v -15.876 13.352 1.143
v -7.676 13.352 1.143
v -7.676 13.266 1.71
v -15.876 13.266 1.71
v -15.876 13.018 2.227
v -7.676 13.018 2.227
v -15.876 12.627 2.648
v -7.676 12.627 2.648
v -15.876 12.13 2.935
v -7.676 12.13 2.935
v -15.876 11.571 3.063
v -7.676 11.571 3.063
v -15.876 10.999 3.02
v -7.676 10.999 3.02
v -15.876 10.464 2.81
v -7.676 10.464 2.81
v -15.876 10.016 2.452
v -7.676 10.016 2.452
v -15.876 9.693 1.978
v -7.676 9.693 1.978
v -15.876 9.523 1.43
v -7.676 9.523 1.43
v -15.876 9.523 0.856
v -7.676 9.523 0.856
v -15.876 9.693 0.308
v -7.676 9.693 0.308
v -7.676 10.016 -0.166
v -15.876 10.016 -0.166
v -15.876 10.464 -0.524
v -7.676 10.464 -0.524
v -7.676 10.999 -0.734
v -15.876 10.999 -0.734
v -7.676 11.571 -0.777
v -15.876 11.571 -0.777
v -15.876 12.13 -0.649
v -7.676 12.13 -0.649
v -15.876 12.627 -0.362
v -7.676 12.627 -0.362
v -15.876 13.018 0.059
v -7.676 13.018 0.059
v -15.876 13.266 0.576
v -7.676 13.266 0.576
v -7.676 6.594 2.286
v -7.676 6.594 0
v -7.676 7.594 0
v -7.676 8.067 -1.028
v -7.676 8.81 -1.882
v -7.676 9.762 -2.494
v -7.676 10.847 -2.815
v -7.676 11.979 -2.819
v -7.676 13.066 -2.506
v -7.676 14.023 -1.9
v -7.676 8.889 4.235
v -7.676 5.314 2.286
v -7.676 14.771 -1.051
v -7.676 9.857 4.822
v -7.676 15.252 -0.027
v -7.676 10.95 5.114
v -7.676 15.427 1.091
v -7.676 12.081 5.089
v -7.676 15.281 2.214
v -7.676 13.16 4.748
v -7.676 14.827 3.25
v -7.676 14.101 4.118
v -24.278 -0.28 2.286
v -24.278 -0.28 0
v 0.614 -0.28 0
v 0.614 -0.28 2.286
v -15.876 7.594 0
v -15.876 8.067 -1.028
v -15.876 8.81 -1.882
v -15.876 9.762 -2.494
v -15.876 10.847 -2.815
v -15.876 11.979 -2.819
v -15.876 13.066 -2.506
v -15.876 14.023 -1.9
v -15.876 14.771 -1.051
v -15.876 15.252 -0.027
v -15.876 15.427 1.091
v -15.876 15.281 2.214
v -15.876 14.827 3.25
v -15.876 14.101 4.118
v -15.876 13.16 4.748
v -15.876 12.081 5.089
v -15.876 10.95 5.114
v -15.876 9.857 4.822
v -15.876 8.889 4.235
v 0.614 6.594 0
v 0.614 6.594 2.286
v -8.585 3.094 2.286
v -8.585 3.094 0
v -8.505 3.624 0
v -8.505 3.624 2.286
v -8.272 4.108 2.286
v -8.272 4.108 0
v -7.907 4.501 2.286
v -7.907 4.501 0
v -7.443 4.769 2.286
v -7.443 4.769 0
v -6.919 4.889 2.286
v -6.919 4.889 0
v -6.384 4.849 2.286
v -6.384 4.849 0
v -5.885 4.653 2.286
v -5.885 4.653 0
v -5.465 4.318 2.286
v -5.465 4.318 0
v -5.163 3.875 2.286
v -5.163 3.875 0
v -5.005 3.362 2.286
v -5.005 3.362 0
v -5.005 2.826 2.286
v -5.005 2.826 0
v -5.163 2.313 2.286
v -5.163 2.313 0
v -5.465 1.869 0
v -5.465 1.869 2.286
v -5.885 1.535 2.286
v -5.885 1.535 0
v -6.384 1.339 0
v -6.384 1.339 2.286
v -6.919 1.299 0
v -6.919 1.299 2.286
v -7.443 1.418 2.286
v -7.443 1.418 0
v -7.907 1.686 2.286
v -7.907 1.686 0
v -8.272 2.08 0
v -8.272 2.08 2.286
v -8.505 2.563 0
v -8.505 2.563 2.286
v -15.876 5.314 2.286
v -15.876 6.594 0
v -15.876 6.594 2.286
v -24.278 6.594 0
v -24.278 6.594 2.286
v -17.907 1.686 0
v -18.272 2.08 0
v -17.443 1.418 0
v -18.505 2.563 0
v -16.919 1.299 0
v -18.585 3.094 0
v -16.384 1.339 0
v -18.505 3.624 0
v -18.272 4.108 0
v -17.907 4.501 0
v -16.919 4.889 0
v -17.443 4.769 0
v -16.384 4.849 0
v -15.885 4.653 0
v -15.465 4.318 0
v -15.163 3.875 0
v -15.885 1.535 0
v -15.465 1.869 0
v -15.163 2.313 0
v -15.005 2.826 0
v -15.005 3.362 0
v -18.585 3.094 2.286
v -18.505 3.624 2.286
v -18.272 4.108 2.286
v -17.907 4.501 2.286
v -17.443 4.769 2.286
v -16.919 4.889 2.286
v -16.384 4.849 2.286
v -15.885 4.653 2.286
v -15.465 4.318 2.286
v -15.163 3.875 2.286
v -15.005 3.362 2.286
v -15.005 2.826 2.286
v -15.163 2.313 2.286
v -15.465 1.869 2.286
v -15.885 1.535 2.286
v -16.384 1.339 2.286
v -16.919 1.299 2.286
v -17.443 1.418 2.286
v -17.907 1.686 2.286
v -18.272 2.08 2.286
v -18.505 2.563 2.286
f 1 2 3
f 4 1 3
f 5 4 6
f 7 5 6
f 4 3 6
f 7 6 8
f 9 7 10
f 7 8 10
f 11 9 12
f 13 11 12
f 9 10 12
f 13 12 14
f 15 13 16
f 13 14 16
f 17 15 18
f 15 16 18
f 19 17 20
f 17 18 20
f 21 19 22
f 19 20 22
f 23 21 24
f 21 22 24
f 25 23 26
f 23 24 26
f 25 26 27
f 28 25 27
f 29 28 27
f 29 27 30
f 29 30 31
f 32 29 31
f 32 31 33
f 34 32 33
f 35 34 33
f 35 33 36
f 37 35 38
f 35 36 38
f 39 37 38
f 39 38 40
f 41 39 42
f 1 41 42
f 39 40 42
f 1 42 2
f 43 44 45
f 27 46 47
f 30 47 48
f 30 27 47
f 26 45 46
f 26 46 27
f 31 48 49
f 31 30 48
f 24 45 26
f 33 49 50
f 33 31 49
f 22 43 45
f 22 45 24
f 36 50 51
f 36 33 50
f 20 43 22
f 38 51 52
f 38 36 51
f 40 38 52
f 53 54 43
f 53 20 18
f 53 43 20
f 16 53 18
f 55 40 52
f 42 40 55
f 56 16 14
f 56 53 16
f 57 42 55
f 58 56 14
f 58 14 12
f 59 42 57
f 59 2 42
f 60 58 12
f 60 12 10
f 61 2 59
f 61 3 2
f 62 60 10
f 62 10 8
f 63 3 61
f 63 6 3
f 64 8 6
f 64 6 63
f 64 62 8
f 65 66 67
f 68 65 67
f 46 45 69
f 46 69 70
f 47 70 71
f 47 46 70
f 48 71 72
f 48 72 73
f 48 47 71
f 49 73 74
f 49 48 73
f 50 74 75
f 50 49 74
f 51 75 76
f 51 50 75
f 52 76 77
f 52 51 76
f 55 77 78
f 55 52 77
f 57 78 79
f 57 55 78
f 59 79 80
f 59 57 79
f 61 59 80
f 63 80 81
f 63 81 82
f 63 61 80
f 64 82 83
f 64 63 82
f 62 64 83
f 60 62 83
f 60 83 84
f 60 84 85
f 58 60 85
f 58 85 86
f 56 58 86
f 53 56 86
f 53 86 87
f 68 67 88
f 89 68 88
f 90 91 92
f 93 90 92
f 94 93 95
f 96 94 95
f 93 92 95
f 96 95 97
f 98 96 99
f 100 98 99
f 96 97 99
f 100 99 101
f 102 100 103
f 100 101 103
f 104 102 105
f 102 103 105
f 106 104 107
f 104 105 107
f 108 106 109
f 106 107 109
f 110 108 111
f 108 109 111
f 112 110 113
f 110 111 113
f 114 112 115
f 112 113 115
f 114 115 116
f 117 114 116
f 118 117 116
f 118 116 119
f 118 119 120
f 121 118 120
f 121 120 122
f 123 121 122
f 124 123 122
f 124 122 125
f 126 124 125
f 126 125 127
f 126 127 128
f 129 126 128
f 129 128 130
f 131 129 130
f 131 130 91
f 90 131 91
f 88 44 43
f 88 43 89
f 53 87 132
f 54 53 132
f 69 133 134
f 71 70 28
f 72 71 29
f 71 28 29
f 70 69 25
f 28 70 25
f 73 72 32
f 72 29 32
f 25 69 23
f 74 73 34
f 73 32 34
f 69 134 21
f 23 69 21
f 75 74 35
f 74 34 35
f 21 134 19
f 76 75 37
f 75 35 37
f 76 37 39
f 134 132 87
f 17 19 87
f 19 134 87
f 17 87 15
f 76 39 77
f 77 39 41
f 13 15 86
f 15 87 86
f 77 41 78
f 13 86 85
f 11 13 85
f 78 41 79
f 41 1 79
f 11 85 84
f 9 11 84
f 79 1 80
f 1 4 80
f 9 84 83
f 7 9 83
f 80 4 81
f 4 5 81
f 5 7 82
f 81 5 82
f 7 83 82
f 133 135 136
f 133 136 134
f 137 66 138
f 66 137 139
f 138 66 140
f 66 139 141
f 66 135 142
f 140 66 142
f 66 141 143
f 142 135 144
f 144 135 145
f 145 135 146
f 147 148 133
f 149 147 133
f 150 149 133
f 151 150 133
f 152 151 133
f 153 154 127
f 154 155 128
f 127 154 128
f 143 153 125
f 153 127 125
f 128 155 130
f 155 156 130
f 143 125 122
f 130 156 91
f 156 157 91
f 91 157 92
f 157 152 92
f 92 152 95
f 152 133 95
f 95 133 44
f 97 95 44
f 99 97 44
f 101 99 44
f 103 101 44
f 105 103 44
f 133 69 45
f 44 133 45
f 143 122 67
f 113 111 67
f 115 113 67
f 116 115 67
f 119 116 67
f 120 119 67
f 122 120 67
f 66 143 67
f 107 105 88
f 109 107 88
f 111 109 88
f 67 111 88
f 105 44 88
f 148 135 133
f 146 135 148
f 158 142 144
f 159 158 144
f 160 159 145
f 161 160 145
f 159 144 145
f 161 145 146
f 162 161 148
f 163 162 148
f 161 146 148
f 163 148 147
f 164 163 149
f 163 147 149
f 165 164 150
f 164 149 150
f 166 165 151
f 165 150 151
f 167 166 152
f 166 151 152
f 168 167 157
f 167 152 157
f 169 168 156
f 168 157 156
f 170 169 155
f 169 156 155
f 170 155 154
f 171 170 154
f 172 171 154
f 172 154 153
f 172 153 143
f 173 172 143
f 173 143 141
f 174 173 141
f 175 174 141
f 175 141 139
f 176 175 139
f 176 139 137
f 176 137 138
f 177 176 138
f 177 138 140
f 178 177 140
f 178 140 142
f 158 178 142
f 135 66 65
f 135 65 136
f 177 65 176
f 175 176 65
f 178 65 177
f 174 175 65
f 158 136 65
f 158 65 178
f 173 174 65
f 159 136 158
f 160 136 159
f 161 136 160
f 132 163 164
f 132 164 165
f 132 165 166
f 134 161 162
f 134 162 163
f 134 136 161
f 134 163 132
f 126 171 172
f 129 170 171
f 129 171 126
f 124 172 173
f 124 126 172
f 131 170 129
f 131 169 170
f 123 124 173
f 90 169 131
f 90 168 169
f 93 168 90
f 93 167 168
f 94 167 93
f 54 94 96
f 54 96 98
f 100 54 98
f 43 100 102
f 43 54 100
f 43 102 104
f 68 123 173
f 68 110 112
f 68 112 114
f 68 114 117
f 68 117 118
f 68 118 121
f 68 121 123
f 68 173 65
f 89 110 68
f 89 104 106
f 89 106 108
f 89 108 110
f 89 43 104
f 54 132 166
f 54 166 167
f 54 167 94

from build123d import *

# Parameters (mm, degrees)
SKETCH1_W           = 24.892
SKETCH1_H           = 7.874
BOSS_EXTRUDE1_DEPTH = 2.286
SKETCH8_R           = 1.8
CUT_EXTRUDE4_DEPTH  = 8.29
BOSS_EXTRUDE2_START = -8.29
SKETCH10_R          = 4
SKETCH10_R_2        = 1.925
BOSS_EXTRUDE2_DEPTH = 8.2
CHAMFER1_START      = -15.87596875
CHAMFER1_DEPTH      = 8.2
SKETCH11_W          = 8.402
SKETCH11_H          = 2.286
SKETCH11_W_2        = 8.29
CUT_EXTRUDE5_DEPTH  = 1


with BuildPart() as part:
    # Sketch1 → Boss-Extrude1 (new body)
    with BuildSketch(Plane.XY):
        with Locations((-11.83196875, 3.65678125)):
            Rectangle(SKETCH1_W, SKETCH1_H)
    extrude(amount=BOSS_EXTRUDE1_DEPTH)

    # Sketch8 → Cut-Extrude4 (cut)
    with BuildSketch(Plane(origin=(0, 0, 0), x_dir=(-1, 0, 0), z_dir=(0, 0, -1))):
        with Locations((6.78496875, 3.09378125)):
            Circle(SKETCH8_R)
        with Locations((16.78496875, 3.09378125)):
            Circle(SKETCH8_R)
    extrude(amount=-CUT_EXTRUDE4_DEPTH, mode=Mode.SUBTRACT)

    # Sketch10 → Boss-Extrude2 (add)
    with BuildSketch(Plane(origin=(0.61403125, 0, 0), x_dir=(0, 0, -1), z_dir=(1, 0, 0)).offset(BOSS_EXTRUDE2_START)):
        with Locations((-1.143, 11.426998045)):
            Circle(SKETCH10_R)
        with Locations(Location((-1.143, 11.426998045, 0), (0, 0, 90))):
            Circle(SKETCH10_R_2, mode=Mode.SUBTRACT)
    extrude(amount=-BOSS_EXTRUDE2_DEPTH)

    # Chamfer1: read off the stored shape, not the designer's step
    # Chamfer1 outline → Chamfer1 (add)
    with BuildSketch(Plane.YZ.offset(CHAMFER1_START)):
        with BuildLine():
            Line((8.88905951, 4.234741902), (5.314022428, 2.286))
            Line((5.314022428, 2.286), (7.59378125, 2.286))
            ThreePointArc((7.59378125, 2.286), (8.095736451, 3.357203285), (8.88905951, 4.234741902))
        make_face()
    extrude(amount=CHAMFER1_DEPTH)

    # Sketch11 → Cut-Extrude5 (cut)
    with BuildSketch(Plane(origin=(0, 7.59378125, 0), x_dir=(1, 0, 0), z_dir=(0, 1, 0))):
        with Locations((-20.07696875, -1.143)):
            Rectangle(SKETCH11_W, SKETCH11_H)
        with Locations((-3.53096875, -1.143)):
            Rectangle(SKETCH11_W_2, SKETCH11_H)
    extrude(amount=-CUT_EXTRUDE5_DEPTH, mode=Mode.SUBTRACT)


solid = part.part
